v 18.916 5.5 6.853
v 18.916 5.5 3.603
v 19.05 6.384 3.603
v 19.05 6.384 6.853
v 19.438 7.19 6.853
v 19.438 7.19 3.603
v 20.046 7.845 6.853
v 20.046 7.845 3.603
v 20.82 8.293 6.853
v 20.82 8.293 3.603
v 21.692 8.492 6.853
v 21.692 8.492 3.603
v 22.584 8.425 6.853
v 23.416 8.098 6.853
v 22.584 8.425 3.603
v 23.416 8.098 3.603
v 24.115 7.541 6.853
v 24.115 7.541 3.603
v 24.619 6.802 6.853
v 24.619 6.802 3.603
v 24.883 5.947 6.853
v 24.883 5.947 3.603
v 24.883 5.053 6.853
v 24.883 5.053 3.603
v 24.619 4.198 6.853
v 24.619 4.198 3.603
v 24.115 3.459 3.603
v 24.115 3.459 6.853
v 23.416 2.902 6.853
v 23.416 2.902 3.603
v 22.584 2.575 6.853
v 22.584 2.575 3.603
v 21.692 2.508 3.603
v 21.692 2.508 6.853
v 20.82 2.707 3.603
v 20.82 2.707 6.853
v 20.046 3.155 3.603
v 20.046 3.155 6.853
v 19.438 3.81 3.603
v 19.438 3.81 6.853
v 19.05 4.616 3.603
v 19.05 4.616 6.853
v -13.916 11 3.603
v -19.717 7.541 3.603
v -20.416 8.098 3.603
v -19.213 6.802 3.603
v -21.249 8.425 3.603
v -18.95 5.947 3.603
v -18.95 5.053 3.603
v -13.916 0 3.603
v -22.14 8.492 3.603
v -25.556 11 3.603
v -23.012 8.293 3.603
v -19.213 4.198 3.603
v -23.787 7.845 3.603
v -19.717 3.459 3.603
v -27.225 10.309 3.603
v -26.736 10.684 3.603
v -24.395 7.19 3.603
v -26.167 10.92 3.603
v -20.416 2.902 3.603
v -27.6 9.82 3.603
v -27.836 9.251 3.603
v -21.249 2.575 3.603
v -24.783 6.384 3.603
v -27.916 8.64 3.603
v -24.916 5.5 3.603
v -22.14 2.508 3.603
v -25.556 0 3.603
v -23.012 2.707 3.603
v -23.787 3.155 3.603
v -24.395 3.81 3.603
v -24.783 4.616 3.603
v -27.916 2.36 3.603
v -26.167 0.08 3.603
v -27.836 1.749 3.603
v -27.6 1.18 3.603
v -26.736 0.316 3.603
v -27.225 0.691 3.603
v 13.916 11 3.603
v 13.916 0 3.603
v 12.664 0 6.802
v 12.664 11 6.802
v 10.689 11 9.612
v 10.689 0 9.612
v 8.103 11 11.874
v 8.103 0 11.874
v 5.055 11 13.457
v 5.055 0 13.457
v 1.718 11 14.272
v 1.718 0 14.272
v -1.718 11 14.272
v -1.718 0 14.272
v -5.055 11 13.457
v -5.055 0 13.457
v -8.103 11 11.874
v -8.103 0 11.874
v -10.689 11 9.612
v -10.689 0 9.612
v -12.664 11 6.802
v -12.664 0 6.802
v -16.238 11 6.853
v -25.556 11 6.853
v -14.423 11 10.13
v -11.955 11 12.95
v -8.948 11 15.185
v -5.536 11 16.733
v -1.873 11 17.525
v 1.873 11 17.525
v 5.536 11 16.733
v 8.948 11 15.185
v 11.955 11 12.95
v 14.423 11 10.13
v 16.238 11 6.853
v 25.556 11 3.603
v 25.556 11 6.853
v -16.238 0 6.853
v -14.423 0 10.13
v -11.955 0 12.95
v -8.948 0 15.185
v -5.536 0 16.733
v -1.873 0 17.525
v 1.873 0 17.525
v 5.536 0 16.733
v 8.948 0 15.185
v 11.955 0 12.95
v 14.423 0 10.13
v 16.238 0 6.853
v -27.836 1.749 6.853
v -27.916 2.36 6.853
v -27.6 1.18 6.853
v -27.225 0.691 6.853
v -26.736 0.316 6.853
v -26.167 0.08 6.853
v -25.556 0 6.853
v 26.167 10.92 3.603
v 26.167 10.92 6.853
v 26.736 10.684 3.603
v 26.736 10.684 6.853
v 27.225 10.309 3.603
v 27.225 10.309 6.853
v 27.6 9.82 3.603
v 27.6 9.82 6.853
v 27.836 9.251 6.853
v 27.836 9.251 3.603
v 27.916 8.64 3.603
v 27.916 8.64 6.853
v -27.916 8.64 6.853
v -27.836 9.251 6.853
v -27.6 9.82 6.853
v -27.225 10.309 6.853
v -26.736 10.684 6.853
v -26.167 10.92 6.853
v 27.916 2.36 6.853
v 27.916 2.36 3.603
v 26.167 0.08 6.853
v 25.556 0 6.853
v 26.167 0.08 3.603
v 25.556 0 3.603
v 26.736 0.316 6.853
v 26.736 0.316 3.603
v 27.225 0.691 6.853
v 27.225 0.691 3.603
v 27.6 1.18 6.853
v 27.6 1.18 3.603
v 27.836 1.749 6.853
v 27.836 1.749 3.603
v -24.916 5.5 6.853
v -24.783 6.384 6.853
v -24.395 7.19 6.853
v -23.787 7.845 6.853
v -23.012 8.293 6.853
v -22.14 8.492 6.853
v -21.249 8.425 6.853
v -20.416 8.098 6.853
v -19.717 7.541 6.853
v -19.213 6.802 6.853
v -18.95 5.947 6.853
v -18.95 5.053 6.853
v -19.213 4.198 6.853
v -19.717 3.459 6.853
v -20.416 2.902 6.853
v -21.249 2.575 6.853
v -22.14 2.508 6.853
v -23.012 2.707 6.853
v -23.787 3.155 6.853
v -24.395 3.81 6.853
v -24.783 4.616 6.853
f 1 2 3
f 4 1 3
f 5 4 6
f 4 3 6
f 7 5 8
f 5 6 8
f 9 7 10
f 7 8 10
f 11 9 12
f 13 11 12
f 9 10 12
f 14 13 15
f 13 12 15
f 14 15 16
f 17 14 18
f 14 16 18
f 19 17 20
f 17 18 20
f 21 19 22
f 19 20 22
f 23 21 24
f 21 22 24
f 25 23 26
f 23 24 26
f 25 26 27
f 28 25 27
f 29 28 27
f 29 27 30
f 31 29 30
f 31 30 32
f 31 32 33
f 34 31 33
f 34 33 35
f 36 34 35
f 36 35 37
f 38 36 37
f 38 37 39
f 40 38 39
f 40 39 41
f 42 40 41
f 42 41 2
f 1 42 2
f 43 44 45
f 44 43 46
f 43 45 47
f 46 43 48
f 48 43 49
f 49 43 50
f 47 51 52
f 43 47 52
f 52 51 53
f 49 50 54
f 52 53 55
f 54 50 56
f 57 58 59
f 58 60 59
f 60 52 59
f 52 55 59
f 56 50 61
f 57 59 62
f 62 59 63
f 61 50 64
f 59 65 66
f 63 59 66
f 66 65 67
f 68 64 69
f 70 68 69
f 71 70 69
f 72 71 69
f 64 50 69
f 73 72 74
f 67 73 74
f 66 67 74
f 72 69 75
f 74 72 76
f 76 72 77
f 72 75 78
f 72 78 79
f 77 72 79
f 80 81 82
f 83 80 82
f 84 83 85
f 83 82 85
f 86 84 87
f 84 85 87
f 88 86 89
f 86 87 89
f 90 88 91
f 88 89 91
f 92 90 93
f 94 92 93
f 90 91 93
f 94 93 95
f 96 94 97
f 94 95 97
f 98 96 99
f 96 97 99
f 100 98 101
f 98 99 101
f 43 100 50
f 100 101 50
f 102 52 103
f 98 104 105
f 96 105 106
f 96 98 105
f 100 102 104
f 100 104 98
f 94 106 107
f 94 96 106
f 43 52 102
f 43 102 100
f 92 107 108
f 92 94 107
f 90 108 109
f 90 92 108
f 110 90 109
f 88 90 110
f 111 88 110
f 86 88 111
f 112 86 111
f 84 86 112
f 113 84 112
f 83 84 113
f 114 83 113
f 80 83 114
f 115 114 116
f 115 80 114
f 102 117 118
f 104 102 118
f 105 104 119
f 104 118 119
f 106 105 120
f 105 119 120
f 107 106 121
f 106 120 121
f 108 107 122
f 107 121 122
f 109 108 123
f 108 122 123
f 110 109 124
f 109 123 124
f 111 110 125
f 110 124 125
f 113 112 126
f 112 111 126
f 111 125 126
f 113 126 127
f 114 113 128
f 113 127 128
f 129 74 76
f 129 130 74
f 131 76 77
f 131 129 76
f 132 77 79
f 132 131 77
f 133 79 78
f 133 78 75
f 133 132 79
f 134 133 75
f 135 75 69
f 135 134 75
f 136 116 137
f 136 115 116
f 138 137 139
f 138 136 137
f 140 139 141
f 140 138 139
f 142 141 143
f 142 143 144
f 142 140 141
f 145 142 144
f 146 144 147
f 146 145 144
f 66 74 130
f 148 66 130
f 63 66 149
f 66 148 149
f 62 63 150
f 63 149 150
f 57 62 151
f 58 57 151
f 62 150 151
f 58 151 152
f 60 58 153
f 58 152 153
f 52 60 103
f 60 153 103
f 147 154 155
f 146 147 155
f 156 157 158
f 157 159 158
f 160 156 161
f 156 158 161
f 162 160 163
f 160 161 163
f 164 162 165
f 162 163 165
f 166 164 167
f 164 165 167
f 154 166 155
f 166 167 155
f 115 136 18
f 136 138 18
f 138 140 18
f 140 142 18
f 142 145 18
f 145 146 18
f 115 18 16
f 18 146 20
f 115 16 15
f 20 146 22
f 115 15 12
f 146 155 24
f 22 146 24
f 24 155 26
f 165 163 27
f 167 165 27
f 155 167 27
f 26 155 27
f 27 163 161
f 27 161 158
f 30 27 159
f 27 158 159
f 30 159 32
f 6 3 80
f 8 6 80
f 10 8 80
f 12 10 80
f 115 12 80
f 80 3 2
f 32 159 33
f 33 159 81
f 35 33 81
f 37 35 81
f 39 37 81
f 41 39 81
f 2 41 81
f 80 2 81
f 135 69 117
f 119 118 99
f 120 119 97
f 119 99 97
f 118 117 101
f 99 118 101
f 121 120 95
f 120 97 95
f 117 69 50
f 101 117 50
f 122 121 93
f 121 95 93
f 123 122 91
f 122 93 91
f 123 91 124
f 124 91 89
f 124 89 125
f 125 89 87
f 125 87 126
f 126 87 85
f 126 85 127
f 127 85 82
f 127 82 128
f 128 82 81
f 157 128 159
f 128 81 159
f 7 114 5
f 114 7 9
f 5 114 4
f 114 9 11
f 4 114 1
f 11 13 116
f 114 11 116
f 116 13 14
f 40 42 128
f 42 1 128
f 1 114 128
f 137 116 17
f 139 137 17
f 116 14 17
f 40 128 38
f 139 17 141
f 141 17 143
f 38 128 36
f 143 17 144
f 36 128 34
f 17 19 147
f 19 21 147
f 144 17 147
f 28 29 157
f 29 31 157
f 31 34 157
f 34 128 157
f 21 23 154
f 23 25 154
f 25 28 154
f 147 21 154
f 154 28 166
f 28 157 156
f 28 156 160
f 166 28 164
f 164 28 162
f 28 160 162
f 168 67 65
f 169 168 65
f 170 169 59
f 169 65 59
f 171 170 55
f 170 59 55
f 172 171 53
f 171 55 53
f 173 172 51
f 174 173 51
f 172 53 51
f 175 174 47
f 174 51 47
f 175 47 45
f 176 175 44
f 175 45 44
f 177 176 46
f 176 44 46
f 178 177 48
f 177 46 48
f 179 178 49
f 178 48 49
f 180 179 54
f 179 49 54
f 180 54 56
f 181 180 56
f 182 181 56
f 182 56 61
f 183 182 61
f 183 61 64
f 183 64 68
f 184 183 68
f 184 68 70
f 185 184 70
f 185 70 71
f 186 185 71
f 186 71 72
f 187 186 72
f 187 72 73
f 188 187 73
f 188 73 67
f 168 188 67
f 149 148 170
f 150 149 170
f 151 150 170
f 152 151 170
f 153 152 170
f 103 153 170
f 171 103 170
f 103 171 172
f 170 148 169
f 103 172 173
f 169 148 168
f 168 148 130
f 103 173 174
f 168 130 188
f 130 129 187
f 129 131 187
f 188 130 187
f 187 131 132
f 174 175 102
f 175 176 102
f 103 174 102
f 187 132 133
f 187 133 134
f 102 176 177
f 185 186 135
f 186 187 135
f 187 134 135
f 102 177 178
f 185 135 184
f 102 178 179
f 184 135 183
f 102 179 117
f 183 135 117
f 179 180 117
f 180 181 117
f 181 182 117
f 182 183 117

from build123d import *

# Parameters (mm, degrees)
BOSS_EXTRUDE1_DEPTH = 11
SKETCH2_R           = 3
CUT_EXTRUDE1_DEPTH  = 30
CUT_EXTRUDE2_DEPTH  = 20
FILLET1_R           = 2.36


with BuildPart() as part:
    # Sketch1 → Boss-Extrude1 (new body)
    with BuildSketch(Plane(origin=(0, 0, 0), x_dir=(1, 0, 0), z_dir=(0, 1, 0))):
        with BuildLine():
            Line((-27.916231576, -22.71939994), (27.916231576, -22.71939994))
            Line((27.916231576, -22.71939994), (27.916231576, -3.602655093))
            Line((27.916231576, -3.602655093), (13.916231576, -3.602655093))
            ThreePointArc((13.916231576, -3.602655093), (0, -14.375), (-13.916231576, -3.602655093))
            Line((-13.916231576, -3.602655093), (-27.916231576, -3.602655093))
            Line((-27.916231576, -3.602655093), (-27.916231576, -22.71939994))
        make_face()
    extrude(amount=BOSS_EXTRUDE1_DEPTH)

    # Sketch2 → Cut-Extrude1 (cut)
    with BuildSketch(Plane(origin=(0, 0, 3.602655093), x_dir=(-1, 0, 0), z_dir=(0, 0, -1))):
        with Locations((21.916231576, 5.5)):
            Circle(SKETCH2_R)
        with Locations((-21.916231576, 5.5)):
            Circle(SKETCH2_R)
    extrude(amount=-CUT_EXTRUDE1_DEPTH, mode=Mode.SUBTRACT)

    # Sketch4 → Cut-Extrude2 (cut)
    with BuildSketch(Plane.XZ):
        with BuildLine():
            Line((27.916231576, 6.852655093), (27.916231576, 7.602655093))
            Line((27.916231576, 7.602655093), (27.916231576, 22.71939994))
            Line((27.916231576, 22.71939994), (-27.916231576, 22.71939994))
            Line((-27.916231576, 22.71939994), (-27.916231576, 7.602655093))
            Line((-27.916231576, 7.602655093), (-27.916231576, 6.852655093))
            Line((-27.916231576, 6.852655093), (-16.238280179, 6.852655093))
            ThreePointArc((-16.238280179, 6.852655093), (0, 17.625), (16.238280179, 6.852655093))
            Line((16.238280179, 6.852655093), (27.916231576, 6.852655093))
        make_face()
    extrude(amount=-CUT_EXTRUDE2_DEPTH, mode=Mode.SUBTRACT)

    # Fillet1
    fillet1_edges = [part.edges().sort_by_distance(p)[0] for p in [
        (27.916231576, 0, 5.227655093),
        (27.916231576, 11, 5.227655093),
        (-27.916231576, 11, 5.227655093),
        (-27.916231576, 0, 5.227655093),
    ]]
    fillet(fillet1_edges, radius=FILLET1_R)


solid = part.part
